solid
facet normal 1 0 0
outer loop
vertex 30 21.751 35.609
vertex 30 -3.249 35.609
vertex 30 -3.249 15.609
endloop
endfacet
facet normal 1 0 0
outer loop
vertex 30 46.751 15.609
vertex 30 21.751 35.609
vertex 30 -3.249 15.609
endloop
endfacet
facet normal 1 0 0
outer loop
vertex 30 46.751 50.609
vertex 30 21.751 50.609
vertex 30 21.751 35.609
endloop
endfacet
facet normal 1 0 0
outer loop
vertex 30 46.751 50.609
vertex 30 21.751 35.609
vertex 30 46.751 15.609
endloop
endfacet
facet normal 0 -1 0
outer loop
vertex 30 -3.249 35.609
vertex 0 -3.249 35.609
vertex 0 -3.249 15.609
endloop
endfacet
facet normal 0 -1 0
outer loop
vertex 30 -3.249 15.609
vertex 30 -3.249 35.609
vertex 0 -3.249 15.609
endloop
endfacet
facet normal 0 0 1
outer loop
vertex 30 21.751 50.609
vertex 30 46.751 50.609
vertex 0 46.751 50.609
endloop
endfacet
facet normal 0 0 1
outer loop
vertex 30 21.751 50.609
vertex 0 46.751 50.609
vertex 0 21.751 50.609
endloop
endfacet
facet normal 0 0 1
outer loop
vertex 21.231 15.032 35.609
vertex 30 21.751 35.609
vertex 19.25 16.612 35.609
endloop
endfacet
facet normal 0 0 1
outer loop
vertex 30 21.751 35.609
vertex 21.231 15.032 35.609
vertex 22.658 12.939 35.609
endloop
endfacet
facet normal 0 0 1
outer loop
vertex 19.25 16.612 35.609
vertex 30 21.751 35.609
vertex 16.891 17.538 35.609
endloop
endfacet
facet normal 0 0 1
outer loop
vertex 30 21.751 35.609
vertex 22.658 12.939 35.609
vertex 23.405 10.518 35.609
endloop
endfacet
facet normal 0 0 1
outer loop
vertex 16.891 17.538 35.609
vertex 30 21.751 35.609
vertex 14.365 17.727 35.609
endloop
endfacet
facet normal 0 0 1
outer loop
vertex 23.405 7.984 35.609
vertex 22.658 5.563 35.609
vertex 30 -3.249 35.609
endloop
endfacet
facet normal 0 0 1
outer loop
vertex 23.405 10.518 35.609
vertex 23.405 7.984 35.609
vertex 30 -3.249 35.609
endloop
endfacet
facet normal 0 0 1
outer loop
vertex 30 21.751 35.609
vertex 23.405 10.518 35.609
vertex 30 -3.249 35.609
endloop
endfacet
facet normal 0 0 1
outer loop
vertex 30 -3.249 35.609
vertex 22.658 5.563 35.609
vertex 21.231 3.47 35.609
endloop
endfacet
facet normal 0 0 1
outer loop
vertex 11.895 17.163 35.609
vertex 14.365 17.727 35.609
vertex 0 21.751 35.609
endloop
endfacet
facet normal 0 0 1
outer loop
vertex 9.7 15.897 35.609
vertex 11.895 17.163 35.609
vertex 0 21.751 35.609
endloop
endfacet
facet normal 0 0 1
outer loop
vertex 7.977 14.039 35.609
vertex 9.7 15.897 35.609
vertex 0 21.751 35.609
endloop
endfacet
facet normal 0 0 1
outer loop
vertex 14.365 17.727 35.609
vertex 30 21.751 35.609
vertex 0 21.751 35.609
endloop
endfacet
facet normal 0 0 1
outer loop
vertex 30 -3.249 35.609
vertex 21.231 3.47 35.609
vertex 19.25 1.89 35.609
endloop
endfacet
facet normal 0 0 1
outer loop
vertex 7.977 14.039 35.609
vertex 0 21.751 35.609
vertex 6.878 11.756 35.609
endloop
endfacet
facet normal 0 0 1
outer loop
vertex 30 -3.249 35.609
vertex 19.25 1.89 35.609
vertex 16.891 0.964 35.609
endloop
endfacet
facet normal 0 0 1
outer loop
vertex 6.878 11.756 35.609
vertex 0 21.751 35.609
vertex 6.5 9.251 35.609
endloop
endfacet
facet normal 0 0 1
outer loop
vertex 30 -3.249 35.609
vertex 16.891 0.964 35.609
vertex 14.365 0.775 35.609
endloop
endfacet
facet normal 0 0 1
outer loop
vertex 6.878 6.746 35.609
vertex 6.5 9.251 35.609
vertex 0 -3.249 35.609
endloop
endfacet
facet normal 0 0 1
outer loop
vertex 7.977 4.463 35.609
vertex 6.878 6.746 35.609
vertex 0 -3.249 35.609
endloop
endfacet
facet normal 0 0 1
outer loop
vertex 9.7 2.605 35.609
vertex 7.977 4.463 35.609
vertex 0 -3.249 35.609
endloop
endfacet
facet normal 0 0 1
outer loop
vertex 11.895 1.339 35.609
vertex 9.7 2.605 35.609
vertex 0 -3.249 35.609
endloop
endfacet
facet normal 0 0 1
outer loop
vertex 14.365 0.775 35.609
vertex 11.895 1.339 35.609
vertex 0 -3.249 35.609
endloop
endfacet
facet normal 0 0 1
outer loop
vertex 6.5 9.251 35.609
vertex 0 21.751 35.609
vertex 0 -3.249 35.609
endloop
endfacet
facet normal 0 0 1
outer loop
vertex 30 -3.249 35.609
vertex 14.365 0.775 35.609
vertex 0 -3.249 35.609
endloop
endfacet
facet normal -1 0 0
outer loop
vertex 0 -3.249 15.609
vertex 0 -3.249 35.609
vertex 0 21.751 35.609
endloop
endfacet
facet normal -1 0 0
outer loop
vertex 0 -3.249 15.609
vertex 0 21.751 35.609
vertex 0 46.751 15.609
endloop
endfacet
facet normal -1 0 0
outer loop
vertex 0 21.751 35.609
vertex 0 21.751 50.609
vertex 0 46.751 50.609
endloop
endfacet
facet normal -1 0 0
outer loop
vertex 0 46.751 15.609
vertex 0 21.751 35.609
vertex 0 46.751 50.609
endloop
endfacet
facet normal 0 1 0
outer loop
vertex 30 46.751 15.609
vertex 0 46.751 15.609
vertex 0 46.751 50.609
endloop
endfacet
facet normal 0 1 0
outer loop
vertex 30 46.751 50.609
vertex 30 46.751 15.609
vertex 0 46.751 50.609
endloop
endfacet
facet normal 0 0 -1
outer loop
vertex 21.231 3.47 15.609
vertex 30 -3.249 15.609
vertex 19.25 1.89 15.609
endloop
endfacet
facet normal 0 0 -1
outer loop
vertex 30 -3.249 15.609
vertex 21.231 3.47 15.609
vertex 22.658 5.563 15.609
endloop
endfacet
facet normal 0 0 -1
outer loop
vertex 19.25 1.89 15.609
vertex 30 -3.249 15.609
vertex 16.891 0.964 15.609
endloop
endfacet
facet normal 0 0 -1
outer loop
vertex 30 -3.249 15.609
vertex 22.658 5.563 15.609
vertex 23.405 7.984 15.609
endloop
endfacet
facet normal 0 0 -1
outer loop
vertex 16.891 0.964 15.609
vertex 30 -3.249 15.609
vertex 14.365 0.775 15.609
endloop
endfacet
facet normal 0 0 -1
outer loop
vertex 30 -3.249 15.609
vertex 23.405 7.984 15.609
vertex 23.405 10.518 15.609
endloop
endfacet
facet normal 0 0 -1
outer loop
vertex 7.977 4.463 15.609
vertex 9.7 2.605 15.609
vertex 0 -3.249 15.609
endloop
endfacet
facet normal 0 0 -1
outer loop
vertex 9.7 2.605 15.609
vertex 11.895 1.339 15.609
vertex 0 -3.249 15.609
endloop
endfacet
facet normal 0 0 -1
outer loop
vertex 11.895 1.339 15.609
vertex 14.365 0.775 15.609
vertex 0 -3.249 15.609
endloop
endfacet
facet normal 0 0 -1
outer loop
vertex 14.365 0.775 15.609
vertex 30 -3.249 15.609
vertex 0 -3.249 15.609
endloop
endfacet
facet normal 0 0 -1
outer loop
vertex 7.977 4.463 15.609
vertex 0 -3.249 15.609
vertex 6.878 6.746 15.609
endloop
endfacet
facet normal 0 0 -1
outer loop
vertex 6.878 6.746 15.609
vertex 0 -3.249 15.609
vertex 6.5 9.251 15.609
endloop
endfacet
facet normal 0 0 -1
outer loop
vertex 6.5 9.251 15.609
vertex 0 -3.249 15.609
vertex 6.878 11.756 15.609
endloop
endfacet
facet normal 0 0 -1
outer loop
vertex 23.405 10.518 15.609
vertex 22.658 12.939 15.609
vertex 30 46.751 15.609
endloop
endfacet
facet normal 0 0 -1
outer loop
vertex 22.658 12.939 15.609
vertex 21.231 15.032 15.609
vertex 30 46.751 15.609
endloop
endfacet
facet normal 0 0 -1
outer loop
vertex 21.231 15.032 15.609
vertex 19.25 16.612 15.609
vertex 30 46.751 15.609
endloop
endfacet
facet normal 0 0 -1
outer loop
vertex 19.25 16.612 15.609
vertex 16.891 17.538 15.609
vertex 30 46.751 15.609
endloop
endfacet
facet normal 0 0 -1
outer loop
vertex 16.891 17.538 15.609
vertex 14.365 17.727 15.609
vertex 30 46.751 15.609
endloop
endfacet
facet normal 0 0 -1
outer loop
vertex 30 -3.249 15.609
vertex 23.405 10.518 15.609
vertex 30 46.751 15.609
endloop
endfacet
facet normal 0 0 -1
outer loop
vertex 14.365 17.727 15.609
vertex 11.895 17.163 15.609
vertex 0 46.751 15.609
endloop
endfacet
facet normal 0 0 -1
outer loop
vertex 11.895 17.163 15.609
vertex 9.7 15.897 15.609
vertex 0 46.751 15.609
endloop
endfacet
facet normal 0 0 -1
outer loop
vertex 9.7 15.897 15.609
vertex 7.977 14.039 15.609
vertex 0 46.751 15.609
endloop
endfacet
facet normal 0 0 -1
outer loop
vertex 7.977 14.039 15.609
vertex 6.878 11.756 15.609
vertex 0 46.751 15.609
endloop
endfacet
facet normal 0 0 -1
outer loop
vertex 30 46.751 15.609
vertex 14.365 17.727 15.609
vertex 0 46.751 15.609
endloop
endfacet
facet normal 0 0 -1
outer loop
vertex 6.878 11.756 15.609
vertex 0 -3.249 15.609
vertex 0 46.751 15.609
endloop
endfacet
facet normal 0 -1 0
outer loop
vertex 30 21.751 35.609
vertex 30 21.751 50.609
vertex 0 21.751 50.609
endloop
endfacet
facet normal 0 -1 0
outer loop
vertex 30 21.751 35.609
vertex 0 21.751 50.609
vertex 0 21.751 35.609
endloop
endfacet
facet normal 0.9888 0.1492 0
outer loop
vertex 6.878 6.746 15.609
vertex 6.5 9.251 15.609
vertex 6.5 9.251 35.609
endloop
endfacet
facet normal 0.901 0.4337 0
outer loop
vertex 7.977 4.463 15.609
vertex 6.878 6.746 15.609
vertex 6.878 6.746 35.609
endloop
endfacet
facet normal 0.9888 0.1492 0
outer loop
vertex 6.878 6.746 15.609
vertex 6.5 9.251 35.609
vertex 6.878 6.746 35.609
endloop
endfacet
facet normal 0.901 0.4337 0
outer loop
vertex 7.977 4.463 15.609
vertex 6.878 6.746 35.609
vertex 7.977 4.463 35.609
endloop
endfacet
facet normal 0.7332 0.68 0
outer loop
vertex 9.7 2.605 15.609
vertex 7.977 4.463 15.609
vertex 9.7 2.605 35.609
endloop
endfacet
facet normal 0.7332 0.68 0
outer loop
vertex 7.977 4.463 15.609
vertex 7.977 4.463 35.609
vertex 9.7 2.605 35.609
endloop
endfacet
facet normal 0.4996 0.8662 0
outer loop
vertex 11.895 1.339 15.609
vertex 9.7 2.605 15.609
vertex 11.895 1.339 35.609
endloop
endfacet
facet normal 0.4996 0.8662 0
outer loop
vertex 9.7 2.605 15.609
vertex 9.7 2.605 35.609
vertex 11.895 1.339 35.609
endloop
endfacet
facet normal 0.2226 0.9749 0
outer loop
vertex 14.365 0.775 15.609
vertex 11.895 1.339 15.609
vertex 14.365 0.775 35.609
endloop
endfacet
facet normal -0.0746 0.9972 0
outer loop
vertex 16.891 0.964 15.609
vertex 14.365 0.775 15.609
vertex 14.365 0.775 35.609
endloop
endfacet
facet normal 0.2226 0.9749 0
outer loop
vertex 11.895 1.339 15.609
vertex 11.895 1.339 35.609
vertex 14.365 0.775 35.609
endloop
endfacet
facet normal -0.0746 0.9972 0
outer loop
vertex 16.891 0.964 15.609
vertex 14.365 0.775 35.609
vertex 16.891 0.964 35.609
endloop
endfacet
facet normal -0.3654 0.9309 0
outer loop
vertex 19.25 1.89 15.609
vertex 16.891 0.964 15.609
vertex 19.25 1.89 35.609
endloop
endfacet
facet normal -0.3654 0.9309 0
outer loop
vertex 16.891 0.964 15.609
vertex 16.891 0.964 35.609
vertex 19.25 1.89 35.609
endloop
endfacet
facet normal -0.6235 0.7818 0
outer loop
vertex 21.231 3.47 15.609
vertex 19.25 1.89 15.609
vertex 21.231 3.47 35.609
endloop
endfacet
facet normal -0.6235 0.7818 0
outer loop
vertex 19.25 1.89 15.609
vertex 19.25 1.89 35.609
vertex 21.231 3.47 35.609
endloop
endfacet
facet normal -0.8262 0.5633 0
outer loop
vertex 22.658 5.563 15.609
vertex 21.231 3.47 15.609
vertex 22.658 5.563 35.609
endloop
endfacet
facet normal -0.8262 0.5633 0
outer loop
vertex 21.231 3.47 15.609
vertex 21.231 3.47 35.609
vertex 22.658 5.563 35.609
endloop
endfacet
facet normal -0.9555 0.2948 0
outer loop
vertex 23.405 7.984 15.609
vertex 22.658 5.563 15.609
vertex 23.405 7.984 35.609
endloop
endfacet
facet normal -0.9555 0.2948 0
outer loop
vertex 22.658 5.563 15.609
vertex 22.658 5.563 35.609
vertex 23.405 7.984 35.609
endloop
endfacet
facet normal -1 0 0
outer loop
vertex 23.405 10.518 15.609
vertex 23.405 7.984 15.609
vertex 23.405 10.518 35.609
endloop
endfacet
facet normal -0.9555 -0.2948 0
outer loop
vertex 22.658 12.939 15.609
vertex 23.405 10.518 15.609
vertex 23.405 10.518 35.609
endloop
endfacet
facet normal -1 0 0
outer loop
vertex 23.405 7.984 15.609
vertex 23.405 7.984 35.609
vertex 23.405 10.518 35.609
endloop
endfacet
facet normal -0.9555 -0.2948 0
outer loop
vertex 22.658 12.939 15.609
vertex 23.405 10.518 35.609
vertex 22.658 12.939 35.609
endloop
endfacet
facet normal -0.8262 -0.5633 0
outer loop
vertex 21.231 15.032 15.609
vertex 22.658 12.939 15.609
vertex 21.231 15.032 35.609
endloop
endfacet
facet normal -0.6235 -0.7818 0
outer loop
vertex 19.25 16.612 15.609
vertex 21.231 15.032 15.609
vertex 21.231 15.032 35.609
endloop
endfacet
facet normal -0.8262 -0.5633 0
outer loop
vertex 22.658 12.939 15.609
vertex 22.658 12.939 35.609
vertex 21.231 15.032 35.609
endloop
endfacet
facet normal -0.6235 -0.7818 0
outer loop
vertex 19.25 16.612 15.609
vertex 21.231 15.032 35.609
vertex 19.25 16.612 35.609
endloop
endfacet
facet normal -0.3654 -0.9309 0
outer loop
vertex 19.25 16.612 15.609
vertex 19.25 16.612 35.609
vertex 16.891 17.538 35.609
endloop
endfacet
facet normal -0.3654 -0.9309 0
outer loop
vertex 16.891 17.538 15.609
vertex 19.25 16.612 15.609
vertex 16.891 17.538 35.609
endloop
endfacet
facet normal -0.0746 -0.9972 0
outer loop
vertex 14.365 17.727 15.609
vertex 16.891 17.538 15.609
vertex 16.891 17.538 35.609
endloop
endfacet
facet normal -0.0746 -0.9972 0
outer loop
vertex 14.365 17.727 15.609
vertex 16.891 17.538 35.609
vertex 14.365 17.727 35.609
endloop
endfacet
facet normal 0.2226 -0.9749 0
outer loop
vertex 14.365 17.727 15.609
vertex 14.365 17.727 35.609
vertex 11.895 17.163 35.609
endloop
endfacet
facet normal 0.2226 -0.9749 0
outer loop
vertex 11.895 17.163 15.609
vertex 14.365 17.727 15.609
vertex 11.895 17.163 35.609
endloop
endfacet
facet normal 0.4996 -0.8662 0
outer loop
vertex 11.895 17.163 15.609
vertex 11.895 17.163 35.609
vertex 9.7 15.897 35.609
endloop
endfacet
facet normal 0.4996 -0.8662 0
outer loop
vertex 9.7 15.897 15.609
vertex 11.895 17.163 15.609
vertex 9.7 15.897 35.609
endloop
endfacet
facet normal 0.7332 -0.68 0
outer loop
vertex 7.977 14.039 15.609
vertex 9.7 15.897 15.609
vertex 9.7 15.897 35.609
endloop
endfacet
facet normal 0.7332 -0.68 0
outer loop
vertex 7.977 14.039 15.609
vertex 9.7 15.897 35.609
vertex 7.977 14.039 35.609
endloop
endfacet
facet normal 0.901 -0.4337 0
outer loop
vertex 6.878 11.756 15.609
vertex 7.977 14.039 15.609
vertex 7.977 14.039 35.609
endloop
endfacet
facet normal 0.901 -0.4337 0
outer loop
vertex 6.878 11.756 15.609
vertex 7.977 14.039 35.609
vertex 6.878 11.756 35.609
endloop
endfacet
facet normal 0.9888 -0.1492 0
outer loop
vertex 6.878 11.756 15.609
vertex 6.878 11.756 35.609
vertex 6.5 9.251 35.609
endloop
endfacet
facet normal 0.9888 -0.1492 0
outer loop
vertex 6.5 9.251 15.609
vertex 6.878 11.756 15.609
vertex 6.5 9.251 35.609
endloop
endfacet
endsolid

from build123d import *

# Parameters (mm, degrees)
F1_DEPTH = 30
F3_D     = 17


with BuildPart() as f1:
    # F0 (on Right) → F1 (new body)
    with BuildSketch(Plane.YZ):
        Polygon((46.7509815469, 15.6090386026), (46.7509815469, 50.6090386026), (21.7509815469, 50.6090386026), (21.7509815469, 35.6090386026), (-3.2490184531, 35.6090386026), (-3.2490184531, 15.6090386026), align=None)
    extrude(amount=F1_DEPTH)

    # F3 (through all)
    with Locations(Plane(origin=(0, 0, 0), x_dir=(1, 0, 0), z_dir=(0, 0, -1))):
        with Locations((15, -9.2509815469)):
            Hole(F3_D / 2)


solid = f1.part
